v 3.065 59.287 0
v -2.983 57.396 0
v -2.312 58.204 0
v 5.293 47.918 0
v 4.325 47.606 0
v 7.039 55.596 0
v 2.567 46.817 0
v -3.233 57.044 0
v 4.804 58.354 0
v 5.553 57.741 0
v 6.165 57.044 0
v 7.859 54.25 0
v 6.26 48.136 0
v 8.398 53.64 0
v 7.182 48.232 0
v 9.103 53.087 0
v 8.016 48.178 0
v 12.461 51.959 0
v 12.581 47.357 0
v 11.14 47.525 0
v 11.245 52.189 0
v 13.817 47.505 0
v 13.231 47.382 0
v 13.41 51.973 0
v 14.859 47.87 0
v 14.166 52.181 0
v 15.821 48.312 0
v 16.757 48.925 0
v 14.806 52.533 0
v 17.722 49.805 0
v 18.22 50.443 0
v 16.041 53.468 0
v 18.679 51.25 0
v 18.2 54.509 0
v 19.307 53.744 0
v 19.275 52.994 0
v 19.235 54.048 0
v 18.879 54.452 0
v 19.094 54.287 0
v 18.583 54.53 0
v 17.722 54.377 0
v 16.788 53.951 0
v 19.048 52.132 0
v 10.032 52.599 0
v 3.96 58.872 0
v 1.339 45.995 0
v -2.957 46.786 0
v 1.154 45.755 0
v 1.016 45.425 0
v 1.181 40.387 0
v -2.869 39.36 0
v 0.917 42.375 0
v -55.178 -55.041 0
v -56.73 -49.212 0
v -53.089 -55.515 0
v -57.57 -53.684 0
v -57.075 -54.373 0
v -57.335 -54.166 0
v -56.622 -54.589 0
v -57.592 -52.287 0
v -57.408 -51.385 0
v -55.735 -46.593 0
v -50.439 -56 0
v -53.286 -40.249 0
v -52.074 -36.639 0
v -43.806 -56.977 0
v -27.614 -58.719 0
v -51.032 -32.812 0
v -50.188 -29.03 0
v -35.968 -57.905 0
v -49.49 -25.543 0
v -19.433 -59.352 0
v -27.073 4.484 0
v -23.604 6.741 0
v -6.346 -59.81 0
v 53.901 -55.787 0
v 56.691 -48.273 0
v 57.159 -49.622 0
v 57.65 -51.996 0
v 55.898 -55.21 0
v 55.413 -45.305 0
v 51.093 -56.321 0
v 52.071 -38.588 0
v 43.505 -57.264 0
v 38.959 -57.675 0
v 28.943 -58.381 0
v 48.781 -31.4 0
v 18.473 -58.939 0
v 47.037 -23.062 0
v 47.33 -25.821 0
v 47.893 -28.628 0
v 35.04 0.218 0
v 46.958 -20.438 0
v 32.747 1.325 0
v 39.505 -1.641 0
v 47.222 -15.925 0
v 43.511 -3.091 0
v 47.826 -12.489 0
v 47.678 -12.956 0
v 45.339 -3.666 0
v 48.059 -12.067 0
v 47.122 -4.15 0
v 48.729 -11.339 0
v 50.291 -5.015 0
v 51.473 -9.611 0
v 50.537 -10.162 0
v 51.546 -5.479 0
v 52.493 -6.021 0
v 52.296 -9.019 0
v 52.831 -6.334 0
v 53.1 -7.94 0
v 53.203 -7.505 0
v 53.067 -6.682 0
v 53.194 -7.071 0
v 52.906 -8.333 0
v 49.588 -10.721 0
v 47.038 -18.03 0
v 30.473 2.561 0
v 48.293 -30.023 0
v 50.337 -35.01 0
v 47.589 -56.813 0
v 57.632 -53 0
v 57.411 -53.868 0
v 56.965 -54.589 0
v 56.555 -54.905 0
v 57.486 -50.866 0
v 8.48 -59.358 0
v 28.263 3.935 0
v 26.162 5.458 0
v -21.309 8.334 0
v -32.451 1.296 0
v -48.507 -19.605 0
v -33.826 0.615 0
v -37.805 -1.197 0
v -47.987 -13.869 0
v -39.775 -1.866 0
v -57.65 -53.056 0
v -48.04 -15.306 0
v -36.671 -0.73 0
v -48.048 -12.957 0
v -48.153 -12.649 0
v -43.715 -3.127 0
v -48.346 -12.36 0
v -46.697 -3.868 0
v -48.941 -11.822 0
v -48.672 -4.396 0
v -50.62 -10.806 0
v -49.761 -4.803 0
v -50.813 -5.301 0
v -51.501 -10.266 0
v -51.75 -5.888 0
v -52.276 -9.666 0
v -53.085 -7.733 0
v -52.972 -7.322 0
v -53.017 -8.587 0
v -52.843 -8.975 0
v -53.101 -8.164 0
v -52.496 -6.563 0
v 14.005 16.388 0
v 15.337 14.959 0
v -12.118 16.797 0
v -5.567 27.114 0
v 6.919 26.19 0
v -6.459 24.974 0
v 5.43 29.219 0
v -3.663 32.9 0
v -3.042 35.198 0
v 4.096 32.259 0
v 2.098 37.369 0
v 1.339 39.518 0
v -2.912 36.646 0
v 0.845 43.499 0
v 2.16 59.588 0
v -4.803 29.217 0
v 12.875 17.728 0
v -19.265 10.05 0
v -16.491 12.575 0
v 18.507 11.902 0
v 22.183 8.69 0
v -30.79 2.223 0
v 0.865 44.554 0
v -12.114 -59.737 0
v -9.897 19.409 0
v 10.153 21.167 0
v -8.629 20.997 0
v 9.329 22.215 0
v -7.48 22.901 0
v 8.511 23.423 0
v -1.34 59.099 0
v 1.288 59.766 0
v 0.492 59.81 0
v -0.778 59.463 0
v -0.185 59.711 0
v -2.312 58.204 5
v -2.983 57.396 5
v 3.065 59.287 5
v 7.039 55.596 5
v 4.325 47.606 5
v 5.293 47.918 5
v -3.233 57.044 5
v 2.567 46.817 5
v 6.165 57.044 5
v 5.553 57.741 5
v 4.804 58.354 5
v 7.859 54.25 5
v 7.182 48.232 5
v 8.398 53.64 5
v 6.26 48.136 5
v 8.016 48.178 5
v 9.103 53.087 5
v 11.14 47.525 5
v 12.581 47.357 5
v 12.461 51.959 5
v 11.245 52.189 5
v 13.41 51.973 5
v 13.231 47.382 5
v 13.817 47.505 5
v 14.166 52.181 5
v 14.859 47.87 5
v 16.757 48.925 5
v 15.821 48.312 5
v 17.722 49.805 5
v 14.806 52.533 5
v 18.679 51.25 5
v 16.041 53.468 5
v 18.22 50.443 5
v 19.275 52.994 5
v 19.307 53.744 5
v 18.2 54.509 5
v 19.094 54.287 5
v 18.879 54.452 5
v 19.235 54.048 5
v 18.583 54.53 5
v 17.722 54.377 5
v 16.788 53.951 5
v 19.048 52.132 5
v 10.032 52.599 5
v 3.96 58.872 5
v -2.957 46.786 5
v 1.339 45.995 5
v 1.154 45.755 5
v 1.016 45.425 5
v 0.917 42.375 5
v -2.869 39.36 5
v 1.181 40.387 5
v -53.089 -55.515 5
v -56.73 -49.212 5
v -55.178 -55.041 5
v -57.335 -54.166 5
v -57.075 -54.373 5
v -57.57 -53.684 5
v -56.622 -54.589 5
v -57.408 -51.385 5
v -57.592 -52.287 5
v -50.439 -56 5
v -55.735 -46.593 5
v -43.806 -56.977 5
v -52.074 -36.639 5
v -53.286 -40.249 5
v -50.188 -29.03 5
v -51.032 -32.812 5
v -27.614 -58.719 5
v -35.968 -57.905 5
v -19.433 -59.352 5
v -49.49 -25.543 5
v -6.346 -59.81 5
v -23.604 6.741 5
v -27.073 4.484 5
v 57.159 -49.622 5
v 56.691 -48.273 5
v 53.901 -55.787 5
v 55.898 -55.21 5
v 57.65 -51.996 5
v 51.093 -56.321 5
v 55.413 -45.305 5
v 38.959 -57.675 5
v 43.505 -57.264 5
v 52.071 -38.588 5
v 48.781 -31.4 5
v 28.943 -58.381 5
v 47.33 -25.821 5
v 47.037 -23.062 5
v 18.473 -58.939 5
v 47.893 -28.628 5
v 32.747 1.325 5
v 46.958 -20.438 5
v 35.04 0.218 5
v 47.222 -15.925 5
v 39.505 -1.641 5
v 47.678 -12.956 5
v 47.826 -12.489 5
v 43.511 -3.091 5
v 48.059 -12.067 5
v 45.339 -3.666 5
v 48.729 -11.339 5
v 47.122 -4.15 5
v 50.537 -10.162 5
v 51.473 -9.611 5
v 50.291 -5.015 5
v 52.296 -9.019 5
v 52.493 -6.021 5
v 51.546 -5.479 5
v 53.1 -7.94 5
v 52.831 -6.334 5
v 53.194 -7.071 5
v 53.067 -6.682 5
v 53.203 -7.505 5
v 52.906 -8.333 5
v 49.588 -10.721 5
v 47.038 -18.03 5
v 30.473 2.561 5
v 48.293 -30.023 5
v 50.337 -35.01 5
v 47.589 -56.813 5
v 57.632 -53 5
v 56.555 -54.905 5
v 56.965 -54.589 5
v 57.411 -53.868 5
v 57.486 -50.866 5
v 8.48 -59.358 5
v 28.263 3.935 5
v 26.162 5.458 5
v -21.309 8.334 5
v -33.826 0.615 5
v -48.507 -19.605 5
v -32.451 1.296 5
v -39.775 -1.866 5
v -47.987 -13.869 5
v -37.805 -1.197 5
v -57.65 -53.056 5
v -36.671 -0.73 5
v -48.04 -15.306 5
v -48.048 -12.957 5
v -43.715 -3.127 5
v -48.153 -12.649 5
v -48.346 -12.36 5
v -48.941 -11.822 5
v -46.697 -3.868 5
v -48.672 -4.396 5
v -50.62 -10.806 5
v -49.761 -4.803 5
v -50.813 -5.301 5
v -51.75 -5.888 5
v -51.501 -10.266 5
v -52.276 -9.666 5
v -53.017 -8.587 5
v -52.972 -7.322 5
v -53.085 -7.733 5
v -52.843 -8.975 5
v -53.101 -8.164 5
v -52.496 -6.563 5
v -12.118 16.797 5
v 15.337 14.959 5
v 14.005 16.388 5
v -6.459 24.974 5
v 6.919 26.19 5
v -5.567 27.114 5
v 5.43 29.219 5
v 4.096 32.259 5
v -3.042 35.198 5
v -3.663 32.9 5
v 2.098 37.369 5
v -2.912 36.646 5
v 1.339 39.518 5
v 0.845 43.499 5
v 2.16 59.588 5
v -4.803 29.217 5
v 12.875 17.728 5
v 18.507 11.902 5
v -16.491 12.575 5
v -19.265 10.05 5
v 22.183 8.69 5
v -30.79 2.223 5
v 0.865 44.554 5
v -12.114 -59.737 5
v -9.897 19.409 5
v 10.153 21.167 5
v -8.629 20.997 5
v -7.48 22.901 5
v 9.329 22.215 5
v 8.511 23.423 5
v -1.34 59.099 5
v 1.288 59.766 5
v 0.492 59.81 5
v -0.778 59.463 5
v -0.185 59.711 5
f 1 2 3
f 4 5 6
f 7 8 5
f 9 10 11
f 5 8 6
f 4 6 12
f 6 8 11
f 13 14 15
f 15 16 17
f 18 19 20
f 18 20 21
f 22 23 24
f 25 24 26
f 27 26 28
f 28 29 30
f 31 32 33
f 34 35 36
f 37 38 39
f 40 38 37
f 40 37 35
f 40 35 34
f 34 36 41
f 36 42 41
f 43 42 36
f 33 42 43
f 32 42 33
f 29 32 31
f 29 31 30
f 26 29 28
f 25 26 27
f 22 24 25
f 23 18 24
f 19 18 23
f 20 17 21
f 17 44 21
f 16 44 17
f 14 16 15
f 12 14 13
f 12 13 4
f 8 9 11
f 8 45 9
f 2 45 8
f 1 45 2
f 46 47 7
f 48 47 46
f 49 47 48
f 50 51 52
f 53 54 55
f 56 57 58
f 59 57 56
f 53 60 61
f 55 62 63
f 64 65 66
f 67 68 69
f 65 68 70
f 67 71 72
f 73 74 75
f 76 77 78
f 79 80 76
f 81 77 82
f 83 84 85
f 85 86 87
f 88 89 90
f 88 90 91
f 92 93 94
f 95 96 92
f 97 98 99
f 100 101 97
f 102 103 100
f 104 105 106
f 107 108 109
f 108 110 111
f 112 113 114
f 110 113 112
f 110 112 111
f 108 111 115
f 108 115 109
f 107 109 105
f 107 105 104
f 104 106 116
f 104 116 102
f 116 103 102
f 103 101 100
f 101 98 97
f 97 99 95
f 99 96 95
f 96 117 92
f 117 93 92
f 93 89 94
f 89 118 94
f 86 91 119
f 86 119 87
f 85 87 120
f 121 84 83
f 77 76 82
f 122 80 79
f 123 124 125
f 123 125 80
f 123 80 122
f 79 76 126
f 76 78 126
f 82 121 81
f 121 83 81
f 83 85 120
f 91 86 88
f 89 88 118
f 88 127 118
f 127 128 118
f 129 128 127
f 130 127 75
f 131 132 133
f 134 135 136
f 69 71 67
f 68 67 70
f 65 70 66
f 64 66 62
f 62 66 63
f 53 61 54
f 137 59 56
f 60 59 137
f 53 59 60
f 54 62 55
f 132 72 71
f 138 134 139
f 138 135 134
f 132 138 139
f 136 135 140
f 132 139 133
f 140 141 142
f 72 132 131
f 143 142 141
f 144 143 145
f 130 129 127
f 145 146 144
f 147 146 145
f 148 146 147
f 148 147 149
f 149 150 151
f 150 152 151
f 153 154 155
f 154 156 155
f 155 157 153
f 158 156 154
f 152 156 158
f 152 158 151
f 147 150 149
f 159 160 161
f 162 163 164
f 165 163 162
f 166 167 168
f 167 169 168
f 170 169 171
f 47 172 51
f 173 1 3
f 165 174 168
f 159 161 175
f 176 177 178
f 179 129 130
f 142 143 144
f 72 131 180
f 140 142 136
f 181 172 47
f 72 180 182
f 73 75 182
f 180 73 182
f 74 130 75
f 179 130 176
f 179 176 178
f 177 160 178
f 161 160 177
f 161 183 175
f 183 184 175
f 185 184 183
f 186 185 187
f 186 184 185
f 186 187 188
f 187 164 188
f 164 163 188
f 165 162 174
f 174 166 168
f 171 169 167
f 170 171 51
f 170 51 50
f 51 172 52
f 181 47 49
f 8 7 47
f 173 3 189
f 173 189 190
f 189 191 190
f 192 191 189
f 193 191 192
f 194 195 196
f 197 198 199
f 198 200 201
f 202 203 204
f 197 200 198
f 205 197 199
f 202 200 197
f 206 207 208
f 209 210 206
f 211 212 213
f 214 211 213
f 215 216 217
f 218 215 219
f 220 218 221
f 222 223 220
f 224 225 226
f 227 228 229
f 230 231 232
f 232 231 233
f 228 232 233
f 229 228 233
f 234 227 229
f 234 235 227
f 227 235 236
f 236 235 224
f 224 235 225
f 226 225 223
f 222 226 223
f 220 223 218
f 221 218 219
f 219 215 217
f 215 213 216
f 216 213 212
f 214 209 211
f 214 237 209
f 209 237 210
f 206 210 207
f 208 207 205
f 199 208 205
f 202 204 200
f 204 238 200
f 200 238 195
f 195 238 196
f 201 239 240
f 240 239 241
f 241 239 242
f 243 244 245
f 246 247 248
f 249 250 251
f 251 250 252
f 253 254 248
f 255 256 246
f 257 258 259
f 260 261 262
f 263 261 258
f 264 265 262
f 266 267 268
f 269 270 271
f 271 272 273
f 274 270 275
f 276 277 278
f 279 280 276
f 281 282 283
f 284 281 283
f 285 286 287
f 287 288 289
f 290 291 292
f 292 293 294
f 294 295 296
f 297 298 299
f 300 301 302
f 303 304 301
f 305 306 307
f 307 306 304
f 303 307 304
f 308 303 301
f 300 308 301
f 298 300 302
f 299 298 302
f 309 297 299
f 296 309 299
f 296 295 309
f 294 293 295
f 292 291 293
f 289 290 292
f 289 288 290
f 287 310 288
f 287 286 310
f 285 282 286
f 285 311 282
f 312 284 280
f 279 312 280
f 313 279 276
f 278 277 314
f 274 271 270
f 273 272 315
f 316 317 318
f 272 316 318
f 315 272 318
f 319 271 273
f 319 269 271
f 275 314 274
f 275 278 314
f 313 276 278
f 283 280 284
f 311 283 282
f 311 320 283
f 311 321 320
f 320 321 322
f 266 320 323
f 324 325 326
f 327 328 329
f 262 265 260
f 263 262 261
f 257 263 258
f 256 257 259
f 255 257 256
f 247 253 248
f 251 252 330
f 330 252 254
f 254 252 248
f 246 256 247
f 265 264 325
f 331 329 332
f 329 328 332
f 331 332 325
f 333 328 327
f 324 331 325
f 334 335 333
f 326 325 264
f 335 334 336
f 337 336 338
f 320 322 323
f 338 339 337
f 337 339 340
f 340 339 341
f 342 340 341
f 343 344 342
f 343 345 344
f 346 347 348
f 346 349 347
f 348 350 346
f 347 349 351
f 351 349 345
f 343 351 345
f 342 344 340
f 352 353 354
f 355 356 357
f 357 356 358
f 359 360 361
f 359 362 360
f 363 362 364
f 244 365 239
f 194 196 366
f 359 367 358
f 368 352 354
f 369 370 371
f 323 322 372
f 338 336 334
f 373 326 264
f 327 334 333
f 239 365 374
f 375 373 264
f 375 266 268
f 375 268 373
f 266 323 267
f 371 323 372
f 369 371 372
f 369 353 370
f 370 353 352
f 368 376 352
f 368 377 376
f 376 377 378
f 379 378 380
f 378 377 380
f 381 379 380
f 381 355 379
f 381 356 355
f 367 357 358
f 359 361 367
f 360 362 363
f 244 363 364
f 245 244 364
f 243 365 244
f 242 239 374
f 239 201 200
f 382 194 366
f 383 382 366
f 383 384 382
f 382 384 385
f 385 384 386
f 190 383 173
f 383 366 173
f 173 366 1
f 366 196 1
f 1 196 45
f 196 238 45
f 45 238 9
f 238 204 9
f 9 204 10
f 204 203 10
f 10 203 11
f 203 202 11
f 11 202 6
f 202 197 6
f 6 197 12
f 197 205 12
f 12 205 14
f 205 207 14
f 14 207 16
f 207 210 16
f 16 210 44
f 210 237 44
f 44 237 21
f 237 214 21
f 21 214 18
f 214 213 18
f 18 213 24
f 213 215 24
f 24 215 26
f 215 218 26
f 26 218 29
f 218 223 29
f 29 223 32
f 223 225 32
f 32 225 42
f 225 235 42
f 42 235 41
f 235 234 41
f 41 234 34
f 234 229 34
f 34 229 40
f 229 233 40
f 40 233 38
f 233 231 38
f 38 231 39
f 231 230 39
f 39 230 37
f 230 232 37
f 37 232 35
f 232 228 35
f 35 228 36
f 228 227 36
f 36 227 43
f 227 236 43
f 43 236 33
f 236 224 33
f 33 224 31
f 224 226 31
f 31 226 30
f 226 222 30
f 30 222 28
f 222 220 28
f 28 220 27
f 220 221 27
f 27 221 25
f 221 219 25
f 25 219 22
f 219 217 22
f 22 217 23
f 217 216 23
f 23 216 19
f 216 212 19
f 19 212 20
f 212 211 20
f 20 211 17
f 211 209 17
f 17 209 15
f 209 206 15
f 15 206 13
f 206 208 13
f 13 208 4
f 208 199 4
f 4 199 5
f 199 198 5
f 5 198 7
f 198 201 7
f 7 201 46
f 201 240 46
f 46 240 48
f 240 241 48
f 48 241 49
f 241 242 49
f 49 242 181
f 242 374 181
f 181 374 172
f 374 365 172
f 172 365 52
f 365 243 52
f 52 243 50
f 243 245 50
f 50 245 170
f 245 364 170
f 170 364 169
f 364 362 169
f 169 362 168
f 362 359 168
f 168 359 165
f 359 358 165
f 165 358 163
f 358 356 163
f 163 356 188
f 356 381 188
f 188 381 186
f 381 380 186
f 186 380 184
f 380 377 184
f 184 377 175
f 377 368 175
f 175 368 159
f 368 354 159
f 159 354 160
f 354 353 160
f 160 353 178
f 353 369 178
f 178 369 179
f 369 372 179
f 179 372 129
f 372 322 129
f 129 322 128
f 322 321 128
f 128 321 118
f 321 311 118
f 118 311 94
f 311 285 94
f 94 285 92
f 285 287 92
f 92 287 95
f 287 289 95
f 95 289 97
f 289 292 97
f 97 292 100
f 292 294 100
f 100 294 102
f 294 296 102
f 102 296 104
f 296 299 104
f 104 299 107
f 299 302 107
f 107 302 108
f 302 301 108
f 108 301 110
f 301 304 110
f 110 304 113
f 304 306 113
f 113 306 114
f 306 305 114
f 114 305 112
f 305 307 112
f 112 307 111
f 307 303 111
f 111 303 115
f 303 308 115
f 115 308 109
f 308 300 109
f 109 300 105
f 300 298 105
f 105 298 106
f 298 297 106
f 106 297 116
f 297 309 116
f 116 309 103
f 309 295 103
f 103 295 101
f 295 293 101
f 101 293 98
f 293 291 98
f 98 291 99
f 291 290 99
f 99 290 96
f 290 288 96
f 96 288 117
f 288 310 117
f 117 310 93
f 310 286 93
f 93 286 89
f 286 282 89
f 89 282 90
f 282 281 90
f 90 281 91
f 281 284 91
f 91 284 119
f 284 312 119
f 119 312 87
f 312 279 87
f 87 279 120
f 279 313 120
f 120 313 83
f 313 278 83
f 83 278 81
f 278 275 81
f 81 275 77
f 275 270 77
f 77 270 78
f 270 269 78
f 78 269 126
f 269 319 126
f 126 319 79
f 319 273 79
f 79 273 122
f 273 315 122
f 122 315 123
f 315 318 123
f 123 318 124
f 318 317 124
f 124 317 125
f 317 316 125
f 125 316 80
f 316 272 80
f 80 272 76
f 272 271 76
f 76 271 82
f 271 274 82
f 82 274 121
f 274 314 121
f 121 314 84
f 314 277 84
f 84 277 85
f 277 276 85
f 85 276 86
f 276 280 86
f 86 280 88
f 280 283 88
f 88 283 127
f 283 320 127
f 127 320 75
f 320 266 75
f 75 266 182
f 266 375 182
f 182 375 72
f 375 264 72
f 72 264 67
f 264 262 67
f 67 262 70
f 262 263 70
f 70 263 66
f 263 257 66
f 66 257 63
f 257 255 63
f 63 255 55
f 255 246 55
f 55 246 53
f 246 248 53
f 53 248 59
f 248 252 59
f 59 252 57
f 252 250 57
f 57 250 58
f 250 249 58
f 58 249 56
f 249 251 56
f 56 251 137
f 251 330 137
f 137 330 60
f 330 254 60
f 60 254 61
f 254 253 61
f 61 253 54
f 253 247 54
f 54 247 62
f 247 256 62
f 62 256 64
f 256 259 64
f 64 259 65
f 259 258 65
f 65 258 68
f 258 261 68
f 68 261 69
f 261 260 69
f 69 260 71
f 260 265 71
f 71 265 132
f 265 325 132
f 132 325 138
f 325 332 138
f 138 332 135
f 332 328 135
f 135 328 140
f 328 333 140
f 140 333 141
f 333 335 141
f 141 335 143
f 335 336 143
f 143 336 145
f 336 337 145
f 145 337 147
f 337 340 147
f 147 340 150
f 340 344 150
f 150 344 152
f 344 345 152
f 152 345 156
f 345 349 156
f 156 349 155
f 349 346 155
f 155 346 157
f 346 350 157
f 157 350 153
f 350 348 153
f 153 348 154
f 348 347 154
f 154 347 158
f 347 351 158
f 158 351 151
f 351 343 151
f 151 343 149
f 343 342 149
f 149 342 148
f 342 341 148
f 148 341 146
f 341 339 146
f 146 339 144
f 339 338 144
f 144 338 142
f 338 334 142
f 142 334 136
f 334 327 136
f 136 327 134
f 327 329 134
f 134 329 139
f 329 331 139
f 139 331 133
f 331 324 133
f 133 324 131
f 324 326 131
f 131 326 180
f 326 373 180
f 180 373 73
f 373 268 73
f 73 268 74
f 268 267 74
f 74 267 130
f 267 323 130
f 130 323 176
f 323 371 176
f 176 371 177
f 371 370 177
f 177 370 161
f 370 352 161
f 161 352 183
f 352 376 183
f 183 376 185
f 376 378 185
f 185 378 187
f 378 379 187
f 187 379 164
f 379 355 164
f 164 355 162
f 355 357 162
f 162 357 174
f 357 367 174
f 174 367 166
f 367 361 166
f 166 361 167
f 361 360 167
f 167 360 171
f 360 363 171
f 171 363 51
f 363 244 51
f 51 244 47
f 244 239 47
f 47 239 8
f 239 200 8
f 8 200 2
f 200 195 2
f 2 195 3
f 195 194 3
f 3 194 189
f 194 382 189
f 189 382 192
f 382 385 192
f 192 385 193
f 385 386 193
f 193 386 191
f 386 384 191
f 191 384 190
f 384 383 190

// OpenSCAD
// Module names are of the form poly_<inkscape-path-id>().  As a result,
// you can associate a polygon in this OpenSCAD program with the corresponding
// SVG element in the Inkscape document by looking for the XML element with
// the attribute id="inkscape-path-id".

// fudge value is used to ensure that subtracted solids are a tad taller
// in the z dimension than the polygon being subtracted from.  This helps
// keep the resulting .stl file manifold.
fudge = 0.1;

module poly_path3(h)
{
  scale([25.4/90, -25.4/90, 1]) union()
  {
    linear_extrude(height=h)
      polygon([[35.975621,-75.001117],[33.055082,-78.714979],[30.156524,-82.993232],[24.517215,-92.799164],[19.241422,-103.531416],[14.512871,-114.302492],[7.432402,-132.411133],[4.745621,-140.025117],[4.185090,-143.104242],[3.250871,-150.148617],[2.993961,-154.129805],[3.064027,-157.868742],[3.601203,-160.954242],[4.088749,-162.123457],[4.745621,-162.975117],[9.094949,-165.887789],[15.325746,-168.683742],[18.753795,-169.786670],[22.180731,-170.558883],[25.449393,-170.899869],[28.402621,-170.709117],[39.472496,-168.394117],[44.579981,-167.802117],[46.880885,-167.889977],[48.957621,-168.326117],[52.650934,-169.617961],[56.058121,-171.183367],[59.374559,-173.357398],[62.795621,-176.475117],[64.558309,-178.735752],[66.185246,-181.594570],[67.492496,-184.718818],[68.296121,-187.775742],[68.412184,-190.432588],[68.154899,-191.506996],[67.656746,-192.356602],[66.894734,-192.939811],[65.845871,-193.215029],[64.487164,-193.140663],[62.795621,-192.675117],[59.485707,-191.165404],[56.839309,-189.454727],[52.462121,-186.141242],[50.193863,-184.893818],[47.514184,-184.156195],[44.154348,-184.106064],[39.845621,-184.921117],[35.546563,-186.375828],[32.254402,-188.101992],[29.758414,-190.063281],[27.847871,-192.223367],[24.940215,-196.994617],[21.845621,-202.125117],[19.677149,-204.594258],[17.022465,-206.765180],[14.032672,-208.603008],[10.858871,-210.072867],[7.652164,-211.139883],[4.563652,-211.769180],[1.744438,-211.925883],[-0.654379,-211.575117],[-2.755539,-210.697342],[-4.747410,-209.405414],[-8.192629,-206.233992],[-10.568723,-203.370633],[-11.454379,-202.125117],[-10.477129,-165.778492],[-10.165129,-139.464445],[-10.318574,-129.848682],[-10.779379,-124.718117],[-12.980238,-116.574961],[-17.018504,-103.523617],[-19.724174,-96.071730],[-22.886207,-88.490023],[-26.503607,-81.144238],[-30.575379,-74.400117],[-35.069129,-68.770492],[-42.939379,-59.516117],[-58.432879,-44.556367],[-68.262285,-35.611836],[-75.504379,-29.529117],[-83.635598,-23.884289],[-95.929129,-15.889242],[-109.098285,-7.876383],[-114.984133,-4.592150],[-119.856379,-2.178117],[-129.937754,2.585508],[-133.954457,4.241836],[-140.933379,6.611883],[-154.897004,11.079758],[-165.462379,13.704883],[-172.461613,15.577211],[-176.317943,17.017498],[-180.045004,18.782758],[-183.367486,20.864658],[-186.010082,23.254867],[-187.697482,25.945053],[-188.096950,27.400033],[-188.154379,28.926883],[-187.855398,30.424763],[-187.238391,31.802393],[-185.229160,34.250086],[-182.484414,36.376334],[-179.361879,38.287508],[-173.414348,41.890117],[-171.304805,43.794295],[-170.622594,44.818639],[-170.248379,45.908883],[-170.032777,49.140961],[-170.219504,54.235570],[-171.873629,69.465633],[-175.358129,90.505570],[-177.832824,102.862523],[-180.820379,116.261883],[-184.514555,129.821693],[-188.810348,142.615742],[-197.487879,165.094258],[-201.010164,174.372576],[-203.415160,182.072836],[-204.064385,185.267733],[-204.273141,187.991963],[-203.987710,190.220141],[-203.154379,191.926883],[-202.235840,192.661650],[-200.630843,193.425950],[-195.514062,195.028498],[-188.109213,196.705235],[-178.721473,198.426867],[-155.218023,201.887650],[-127.445129,205.176508],[-97.844203,208.059100],[-68.856660,210.301086],[-42.923914,211.668127],[-22.487379,211.925883],[30.048559,210.324070],[65.455348,208.840430],[102.553621,206.862633],[138.042582,204.361430],[154.152071,202.905410],[168.621434,201.307570],[181.038069,199.564254],[190.989379,197.671805],[198.062763,195.626566],[200.391295,194.545509],[201.845621,193.424883],[203.424308,190.870716],[204.209068,187.795707],[204.273141,184.237715],[203.689762,180.234602],[202.532170,175.824226],[200.873604,171.044449],[196.346496,160.528133],[184.503043,136.728539],[178.358502,124.051027],[172.846621,111.258883],[171.116650,106.382038],[169.699363,101.436750],[167.704621,91.490070],[166.665942,81.717297],[166.386871,72.416883],[166.670957,63.887281],[167.321746,56.426945],[168.937621,45.907883],[169.461241,44.250779],[170.286141,42.758383],[172.661527,40.177945],[175.707274,37.987039],[179.066871,36.006133],[182.383813,34.055695],[185.301590,31.956195],[187.463695,29.528102],[188.149963,28.134729],[188.513621,26.591883],[188.482528,25.053780],[188.033645,23.677199],[187.196062,22.443546],[185.998871,21.334227],[182.642035,19.414207],[178.195871,17.768383],[166.966496,14.704289],[160.648754,12.988504],[154.172621,10.951883],[139.979434,5.816320],[124.156871,-0.773867],[116.031137,-4.694133],[107.973934,-9.073680],[100.143887,-13.944383],[92.699621,-19.338117],[78.600949,-30.791711],[65.576746,-42.172367],[54.343731,-53.005148],[49.622893,-58.067668],[45.618621,-62.815117],[35.975621,-75.001117]]);
  }
}

module TentConvert(h)
{

poly_path3(h);
}

TentConvert(5);
